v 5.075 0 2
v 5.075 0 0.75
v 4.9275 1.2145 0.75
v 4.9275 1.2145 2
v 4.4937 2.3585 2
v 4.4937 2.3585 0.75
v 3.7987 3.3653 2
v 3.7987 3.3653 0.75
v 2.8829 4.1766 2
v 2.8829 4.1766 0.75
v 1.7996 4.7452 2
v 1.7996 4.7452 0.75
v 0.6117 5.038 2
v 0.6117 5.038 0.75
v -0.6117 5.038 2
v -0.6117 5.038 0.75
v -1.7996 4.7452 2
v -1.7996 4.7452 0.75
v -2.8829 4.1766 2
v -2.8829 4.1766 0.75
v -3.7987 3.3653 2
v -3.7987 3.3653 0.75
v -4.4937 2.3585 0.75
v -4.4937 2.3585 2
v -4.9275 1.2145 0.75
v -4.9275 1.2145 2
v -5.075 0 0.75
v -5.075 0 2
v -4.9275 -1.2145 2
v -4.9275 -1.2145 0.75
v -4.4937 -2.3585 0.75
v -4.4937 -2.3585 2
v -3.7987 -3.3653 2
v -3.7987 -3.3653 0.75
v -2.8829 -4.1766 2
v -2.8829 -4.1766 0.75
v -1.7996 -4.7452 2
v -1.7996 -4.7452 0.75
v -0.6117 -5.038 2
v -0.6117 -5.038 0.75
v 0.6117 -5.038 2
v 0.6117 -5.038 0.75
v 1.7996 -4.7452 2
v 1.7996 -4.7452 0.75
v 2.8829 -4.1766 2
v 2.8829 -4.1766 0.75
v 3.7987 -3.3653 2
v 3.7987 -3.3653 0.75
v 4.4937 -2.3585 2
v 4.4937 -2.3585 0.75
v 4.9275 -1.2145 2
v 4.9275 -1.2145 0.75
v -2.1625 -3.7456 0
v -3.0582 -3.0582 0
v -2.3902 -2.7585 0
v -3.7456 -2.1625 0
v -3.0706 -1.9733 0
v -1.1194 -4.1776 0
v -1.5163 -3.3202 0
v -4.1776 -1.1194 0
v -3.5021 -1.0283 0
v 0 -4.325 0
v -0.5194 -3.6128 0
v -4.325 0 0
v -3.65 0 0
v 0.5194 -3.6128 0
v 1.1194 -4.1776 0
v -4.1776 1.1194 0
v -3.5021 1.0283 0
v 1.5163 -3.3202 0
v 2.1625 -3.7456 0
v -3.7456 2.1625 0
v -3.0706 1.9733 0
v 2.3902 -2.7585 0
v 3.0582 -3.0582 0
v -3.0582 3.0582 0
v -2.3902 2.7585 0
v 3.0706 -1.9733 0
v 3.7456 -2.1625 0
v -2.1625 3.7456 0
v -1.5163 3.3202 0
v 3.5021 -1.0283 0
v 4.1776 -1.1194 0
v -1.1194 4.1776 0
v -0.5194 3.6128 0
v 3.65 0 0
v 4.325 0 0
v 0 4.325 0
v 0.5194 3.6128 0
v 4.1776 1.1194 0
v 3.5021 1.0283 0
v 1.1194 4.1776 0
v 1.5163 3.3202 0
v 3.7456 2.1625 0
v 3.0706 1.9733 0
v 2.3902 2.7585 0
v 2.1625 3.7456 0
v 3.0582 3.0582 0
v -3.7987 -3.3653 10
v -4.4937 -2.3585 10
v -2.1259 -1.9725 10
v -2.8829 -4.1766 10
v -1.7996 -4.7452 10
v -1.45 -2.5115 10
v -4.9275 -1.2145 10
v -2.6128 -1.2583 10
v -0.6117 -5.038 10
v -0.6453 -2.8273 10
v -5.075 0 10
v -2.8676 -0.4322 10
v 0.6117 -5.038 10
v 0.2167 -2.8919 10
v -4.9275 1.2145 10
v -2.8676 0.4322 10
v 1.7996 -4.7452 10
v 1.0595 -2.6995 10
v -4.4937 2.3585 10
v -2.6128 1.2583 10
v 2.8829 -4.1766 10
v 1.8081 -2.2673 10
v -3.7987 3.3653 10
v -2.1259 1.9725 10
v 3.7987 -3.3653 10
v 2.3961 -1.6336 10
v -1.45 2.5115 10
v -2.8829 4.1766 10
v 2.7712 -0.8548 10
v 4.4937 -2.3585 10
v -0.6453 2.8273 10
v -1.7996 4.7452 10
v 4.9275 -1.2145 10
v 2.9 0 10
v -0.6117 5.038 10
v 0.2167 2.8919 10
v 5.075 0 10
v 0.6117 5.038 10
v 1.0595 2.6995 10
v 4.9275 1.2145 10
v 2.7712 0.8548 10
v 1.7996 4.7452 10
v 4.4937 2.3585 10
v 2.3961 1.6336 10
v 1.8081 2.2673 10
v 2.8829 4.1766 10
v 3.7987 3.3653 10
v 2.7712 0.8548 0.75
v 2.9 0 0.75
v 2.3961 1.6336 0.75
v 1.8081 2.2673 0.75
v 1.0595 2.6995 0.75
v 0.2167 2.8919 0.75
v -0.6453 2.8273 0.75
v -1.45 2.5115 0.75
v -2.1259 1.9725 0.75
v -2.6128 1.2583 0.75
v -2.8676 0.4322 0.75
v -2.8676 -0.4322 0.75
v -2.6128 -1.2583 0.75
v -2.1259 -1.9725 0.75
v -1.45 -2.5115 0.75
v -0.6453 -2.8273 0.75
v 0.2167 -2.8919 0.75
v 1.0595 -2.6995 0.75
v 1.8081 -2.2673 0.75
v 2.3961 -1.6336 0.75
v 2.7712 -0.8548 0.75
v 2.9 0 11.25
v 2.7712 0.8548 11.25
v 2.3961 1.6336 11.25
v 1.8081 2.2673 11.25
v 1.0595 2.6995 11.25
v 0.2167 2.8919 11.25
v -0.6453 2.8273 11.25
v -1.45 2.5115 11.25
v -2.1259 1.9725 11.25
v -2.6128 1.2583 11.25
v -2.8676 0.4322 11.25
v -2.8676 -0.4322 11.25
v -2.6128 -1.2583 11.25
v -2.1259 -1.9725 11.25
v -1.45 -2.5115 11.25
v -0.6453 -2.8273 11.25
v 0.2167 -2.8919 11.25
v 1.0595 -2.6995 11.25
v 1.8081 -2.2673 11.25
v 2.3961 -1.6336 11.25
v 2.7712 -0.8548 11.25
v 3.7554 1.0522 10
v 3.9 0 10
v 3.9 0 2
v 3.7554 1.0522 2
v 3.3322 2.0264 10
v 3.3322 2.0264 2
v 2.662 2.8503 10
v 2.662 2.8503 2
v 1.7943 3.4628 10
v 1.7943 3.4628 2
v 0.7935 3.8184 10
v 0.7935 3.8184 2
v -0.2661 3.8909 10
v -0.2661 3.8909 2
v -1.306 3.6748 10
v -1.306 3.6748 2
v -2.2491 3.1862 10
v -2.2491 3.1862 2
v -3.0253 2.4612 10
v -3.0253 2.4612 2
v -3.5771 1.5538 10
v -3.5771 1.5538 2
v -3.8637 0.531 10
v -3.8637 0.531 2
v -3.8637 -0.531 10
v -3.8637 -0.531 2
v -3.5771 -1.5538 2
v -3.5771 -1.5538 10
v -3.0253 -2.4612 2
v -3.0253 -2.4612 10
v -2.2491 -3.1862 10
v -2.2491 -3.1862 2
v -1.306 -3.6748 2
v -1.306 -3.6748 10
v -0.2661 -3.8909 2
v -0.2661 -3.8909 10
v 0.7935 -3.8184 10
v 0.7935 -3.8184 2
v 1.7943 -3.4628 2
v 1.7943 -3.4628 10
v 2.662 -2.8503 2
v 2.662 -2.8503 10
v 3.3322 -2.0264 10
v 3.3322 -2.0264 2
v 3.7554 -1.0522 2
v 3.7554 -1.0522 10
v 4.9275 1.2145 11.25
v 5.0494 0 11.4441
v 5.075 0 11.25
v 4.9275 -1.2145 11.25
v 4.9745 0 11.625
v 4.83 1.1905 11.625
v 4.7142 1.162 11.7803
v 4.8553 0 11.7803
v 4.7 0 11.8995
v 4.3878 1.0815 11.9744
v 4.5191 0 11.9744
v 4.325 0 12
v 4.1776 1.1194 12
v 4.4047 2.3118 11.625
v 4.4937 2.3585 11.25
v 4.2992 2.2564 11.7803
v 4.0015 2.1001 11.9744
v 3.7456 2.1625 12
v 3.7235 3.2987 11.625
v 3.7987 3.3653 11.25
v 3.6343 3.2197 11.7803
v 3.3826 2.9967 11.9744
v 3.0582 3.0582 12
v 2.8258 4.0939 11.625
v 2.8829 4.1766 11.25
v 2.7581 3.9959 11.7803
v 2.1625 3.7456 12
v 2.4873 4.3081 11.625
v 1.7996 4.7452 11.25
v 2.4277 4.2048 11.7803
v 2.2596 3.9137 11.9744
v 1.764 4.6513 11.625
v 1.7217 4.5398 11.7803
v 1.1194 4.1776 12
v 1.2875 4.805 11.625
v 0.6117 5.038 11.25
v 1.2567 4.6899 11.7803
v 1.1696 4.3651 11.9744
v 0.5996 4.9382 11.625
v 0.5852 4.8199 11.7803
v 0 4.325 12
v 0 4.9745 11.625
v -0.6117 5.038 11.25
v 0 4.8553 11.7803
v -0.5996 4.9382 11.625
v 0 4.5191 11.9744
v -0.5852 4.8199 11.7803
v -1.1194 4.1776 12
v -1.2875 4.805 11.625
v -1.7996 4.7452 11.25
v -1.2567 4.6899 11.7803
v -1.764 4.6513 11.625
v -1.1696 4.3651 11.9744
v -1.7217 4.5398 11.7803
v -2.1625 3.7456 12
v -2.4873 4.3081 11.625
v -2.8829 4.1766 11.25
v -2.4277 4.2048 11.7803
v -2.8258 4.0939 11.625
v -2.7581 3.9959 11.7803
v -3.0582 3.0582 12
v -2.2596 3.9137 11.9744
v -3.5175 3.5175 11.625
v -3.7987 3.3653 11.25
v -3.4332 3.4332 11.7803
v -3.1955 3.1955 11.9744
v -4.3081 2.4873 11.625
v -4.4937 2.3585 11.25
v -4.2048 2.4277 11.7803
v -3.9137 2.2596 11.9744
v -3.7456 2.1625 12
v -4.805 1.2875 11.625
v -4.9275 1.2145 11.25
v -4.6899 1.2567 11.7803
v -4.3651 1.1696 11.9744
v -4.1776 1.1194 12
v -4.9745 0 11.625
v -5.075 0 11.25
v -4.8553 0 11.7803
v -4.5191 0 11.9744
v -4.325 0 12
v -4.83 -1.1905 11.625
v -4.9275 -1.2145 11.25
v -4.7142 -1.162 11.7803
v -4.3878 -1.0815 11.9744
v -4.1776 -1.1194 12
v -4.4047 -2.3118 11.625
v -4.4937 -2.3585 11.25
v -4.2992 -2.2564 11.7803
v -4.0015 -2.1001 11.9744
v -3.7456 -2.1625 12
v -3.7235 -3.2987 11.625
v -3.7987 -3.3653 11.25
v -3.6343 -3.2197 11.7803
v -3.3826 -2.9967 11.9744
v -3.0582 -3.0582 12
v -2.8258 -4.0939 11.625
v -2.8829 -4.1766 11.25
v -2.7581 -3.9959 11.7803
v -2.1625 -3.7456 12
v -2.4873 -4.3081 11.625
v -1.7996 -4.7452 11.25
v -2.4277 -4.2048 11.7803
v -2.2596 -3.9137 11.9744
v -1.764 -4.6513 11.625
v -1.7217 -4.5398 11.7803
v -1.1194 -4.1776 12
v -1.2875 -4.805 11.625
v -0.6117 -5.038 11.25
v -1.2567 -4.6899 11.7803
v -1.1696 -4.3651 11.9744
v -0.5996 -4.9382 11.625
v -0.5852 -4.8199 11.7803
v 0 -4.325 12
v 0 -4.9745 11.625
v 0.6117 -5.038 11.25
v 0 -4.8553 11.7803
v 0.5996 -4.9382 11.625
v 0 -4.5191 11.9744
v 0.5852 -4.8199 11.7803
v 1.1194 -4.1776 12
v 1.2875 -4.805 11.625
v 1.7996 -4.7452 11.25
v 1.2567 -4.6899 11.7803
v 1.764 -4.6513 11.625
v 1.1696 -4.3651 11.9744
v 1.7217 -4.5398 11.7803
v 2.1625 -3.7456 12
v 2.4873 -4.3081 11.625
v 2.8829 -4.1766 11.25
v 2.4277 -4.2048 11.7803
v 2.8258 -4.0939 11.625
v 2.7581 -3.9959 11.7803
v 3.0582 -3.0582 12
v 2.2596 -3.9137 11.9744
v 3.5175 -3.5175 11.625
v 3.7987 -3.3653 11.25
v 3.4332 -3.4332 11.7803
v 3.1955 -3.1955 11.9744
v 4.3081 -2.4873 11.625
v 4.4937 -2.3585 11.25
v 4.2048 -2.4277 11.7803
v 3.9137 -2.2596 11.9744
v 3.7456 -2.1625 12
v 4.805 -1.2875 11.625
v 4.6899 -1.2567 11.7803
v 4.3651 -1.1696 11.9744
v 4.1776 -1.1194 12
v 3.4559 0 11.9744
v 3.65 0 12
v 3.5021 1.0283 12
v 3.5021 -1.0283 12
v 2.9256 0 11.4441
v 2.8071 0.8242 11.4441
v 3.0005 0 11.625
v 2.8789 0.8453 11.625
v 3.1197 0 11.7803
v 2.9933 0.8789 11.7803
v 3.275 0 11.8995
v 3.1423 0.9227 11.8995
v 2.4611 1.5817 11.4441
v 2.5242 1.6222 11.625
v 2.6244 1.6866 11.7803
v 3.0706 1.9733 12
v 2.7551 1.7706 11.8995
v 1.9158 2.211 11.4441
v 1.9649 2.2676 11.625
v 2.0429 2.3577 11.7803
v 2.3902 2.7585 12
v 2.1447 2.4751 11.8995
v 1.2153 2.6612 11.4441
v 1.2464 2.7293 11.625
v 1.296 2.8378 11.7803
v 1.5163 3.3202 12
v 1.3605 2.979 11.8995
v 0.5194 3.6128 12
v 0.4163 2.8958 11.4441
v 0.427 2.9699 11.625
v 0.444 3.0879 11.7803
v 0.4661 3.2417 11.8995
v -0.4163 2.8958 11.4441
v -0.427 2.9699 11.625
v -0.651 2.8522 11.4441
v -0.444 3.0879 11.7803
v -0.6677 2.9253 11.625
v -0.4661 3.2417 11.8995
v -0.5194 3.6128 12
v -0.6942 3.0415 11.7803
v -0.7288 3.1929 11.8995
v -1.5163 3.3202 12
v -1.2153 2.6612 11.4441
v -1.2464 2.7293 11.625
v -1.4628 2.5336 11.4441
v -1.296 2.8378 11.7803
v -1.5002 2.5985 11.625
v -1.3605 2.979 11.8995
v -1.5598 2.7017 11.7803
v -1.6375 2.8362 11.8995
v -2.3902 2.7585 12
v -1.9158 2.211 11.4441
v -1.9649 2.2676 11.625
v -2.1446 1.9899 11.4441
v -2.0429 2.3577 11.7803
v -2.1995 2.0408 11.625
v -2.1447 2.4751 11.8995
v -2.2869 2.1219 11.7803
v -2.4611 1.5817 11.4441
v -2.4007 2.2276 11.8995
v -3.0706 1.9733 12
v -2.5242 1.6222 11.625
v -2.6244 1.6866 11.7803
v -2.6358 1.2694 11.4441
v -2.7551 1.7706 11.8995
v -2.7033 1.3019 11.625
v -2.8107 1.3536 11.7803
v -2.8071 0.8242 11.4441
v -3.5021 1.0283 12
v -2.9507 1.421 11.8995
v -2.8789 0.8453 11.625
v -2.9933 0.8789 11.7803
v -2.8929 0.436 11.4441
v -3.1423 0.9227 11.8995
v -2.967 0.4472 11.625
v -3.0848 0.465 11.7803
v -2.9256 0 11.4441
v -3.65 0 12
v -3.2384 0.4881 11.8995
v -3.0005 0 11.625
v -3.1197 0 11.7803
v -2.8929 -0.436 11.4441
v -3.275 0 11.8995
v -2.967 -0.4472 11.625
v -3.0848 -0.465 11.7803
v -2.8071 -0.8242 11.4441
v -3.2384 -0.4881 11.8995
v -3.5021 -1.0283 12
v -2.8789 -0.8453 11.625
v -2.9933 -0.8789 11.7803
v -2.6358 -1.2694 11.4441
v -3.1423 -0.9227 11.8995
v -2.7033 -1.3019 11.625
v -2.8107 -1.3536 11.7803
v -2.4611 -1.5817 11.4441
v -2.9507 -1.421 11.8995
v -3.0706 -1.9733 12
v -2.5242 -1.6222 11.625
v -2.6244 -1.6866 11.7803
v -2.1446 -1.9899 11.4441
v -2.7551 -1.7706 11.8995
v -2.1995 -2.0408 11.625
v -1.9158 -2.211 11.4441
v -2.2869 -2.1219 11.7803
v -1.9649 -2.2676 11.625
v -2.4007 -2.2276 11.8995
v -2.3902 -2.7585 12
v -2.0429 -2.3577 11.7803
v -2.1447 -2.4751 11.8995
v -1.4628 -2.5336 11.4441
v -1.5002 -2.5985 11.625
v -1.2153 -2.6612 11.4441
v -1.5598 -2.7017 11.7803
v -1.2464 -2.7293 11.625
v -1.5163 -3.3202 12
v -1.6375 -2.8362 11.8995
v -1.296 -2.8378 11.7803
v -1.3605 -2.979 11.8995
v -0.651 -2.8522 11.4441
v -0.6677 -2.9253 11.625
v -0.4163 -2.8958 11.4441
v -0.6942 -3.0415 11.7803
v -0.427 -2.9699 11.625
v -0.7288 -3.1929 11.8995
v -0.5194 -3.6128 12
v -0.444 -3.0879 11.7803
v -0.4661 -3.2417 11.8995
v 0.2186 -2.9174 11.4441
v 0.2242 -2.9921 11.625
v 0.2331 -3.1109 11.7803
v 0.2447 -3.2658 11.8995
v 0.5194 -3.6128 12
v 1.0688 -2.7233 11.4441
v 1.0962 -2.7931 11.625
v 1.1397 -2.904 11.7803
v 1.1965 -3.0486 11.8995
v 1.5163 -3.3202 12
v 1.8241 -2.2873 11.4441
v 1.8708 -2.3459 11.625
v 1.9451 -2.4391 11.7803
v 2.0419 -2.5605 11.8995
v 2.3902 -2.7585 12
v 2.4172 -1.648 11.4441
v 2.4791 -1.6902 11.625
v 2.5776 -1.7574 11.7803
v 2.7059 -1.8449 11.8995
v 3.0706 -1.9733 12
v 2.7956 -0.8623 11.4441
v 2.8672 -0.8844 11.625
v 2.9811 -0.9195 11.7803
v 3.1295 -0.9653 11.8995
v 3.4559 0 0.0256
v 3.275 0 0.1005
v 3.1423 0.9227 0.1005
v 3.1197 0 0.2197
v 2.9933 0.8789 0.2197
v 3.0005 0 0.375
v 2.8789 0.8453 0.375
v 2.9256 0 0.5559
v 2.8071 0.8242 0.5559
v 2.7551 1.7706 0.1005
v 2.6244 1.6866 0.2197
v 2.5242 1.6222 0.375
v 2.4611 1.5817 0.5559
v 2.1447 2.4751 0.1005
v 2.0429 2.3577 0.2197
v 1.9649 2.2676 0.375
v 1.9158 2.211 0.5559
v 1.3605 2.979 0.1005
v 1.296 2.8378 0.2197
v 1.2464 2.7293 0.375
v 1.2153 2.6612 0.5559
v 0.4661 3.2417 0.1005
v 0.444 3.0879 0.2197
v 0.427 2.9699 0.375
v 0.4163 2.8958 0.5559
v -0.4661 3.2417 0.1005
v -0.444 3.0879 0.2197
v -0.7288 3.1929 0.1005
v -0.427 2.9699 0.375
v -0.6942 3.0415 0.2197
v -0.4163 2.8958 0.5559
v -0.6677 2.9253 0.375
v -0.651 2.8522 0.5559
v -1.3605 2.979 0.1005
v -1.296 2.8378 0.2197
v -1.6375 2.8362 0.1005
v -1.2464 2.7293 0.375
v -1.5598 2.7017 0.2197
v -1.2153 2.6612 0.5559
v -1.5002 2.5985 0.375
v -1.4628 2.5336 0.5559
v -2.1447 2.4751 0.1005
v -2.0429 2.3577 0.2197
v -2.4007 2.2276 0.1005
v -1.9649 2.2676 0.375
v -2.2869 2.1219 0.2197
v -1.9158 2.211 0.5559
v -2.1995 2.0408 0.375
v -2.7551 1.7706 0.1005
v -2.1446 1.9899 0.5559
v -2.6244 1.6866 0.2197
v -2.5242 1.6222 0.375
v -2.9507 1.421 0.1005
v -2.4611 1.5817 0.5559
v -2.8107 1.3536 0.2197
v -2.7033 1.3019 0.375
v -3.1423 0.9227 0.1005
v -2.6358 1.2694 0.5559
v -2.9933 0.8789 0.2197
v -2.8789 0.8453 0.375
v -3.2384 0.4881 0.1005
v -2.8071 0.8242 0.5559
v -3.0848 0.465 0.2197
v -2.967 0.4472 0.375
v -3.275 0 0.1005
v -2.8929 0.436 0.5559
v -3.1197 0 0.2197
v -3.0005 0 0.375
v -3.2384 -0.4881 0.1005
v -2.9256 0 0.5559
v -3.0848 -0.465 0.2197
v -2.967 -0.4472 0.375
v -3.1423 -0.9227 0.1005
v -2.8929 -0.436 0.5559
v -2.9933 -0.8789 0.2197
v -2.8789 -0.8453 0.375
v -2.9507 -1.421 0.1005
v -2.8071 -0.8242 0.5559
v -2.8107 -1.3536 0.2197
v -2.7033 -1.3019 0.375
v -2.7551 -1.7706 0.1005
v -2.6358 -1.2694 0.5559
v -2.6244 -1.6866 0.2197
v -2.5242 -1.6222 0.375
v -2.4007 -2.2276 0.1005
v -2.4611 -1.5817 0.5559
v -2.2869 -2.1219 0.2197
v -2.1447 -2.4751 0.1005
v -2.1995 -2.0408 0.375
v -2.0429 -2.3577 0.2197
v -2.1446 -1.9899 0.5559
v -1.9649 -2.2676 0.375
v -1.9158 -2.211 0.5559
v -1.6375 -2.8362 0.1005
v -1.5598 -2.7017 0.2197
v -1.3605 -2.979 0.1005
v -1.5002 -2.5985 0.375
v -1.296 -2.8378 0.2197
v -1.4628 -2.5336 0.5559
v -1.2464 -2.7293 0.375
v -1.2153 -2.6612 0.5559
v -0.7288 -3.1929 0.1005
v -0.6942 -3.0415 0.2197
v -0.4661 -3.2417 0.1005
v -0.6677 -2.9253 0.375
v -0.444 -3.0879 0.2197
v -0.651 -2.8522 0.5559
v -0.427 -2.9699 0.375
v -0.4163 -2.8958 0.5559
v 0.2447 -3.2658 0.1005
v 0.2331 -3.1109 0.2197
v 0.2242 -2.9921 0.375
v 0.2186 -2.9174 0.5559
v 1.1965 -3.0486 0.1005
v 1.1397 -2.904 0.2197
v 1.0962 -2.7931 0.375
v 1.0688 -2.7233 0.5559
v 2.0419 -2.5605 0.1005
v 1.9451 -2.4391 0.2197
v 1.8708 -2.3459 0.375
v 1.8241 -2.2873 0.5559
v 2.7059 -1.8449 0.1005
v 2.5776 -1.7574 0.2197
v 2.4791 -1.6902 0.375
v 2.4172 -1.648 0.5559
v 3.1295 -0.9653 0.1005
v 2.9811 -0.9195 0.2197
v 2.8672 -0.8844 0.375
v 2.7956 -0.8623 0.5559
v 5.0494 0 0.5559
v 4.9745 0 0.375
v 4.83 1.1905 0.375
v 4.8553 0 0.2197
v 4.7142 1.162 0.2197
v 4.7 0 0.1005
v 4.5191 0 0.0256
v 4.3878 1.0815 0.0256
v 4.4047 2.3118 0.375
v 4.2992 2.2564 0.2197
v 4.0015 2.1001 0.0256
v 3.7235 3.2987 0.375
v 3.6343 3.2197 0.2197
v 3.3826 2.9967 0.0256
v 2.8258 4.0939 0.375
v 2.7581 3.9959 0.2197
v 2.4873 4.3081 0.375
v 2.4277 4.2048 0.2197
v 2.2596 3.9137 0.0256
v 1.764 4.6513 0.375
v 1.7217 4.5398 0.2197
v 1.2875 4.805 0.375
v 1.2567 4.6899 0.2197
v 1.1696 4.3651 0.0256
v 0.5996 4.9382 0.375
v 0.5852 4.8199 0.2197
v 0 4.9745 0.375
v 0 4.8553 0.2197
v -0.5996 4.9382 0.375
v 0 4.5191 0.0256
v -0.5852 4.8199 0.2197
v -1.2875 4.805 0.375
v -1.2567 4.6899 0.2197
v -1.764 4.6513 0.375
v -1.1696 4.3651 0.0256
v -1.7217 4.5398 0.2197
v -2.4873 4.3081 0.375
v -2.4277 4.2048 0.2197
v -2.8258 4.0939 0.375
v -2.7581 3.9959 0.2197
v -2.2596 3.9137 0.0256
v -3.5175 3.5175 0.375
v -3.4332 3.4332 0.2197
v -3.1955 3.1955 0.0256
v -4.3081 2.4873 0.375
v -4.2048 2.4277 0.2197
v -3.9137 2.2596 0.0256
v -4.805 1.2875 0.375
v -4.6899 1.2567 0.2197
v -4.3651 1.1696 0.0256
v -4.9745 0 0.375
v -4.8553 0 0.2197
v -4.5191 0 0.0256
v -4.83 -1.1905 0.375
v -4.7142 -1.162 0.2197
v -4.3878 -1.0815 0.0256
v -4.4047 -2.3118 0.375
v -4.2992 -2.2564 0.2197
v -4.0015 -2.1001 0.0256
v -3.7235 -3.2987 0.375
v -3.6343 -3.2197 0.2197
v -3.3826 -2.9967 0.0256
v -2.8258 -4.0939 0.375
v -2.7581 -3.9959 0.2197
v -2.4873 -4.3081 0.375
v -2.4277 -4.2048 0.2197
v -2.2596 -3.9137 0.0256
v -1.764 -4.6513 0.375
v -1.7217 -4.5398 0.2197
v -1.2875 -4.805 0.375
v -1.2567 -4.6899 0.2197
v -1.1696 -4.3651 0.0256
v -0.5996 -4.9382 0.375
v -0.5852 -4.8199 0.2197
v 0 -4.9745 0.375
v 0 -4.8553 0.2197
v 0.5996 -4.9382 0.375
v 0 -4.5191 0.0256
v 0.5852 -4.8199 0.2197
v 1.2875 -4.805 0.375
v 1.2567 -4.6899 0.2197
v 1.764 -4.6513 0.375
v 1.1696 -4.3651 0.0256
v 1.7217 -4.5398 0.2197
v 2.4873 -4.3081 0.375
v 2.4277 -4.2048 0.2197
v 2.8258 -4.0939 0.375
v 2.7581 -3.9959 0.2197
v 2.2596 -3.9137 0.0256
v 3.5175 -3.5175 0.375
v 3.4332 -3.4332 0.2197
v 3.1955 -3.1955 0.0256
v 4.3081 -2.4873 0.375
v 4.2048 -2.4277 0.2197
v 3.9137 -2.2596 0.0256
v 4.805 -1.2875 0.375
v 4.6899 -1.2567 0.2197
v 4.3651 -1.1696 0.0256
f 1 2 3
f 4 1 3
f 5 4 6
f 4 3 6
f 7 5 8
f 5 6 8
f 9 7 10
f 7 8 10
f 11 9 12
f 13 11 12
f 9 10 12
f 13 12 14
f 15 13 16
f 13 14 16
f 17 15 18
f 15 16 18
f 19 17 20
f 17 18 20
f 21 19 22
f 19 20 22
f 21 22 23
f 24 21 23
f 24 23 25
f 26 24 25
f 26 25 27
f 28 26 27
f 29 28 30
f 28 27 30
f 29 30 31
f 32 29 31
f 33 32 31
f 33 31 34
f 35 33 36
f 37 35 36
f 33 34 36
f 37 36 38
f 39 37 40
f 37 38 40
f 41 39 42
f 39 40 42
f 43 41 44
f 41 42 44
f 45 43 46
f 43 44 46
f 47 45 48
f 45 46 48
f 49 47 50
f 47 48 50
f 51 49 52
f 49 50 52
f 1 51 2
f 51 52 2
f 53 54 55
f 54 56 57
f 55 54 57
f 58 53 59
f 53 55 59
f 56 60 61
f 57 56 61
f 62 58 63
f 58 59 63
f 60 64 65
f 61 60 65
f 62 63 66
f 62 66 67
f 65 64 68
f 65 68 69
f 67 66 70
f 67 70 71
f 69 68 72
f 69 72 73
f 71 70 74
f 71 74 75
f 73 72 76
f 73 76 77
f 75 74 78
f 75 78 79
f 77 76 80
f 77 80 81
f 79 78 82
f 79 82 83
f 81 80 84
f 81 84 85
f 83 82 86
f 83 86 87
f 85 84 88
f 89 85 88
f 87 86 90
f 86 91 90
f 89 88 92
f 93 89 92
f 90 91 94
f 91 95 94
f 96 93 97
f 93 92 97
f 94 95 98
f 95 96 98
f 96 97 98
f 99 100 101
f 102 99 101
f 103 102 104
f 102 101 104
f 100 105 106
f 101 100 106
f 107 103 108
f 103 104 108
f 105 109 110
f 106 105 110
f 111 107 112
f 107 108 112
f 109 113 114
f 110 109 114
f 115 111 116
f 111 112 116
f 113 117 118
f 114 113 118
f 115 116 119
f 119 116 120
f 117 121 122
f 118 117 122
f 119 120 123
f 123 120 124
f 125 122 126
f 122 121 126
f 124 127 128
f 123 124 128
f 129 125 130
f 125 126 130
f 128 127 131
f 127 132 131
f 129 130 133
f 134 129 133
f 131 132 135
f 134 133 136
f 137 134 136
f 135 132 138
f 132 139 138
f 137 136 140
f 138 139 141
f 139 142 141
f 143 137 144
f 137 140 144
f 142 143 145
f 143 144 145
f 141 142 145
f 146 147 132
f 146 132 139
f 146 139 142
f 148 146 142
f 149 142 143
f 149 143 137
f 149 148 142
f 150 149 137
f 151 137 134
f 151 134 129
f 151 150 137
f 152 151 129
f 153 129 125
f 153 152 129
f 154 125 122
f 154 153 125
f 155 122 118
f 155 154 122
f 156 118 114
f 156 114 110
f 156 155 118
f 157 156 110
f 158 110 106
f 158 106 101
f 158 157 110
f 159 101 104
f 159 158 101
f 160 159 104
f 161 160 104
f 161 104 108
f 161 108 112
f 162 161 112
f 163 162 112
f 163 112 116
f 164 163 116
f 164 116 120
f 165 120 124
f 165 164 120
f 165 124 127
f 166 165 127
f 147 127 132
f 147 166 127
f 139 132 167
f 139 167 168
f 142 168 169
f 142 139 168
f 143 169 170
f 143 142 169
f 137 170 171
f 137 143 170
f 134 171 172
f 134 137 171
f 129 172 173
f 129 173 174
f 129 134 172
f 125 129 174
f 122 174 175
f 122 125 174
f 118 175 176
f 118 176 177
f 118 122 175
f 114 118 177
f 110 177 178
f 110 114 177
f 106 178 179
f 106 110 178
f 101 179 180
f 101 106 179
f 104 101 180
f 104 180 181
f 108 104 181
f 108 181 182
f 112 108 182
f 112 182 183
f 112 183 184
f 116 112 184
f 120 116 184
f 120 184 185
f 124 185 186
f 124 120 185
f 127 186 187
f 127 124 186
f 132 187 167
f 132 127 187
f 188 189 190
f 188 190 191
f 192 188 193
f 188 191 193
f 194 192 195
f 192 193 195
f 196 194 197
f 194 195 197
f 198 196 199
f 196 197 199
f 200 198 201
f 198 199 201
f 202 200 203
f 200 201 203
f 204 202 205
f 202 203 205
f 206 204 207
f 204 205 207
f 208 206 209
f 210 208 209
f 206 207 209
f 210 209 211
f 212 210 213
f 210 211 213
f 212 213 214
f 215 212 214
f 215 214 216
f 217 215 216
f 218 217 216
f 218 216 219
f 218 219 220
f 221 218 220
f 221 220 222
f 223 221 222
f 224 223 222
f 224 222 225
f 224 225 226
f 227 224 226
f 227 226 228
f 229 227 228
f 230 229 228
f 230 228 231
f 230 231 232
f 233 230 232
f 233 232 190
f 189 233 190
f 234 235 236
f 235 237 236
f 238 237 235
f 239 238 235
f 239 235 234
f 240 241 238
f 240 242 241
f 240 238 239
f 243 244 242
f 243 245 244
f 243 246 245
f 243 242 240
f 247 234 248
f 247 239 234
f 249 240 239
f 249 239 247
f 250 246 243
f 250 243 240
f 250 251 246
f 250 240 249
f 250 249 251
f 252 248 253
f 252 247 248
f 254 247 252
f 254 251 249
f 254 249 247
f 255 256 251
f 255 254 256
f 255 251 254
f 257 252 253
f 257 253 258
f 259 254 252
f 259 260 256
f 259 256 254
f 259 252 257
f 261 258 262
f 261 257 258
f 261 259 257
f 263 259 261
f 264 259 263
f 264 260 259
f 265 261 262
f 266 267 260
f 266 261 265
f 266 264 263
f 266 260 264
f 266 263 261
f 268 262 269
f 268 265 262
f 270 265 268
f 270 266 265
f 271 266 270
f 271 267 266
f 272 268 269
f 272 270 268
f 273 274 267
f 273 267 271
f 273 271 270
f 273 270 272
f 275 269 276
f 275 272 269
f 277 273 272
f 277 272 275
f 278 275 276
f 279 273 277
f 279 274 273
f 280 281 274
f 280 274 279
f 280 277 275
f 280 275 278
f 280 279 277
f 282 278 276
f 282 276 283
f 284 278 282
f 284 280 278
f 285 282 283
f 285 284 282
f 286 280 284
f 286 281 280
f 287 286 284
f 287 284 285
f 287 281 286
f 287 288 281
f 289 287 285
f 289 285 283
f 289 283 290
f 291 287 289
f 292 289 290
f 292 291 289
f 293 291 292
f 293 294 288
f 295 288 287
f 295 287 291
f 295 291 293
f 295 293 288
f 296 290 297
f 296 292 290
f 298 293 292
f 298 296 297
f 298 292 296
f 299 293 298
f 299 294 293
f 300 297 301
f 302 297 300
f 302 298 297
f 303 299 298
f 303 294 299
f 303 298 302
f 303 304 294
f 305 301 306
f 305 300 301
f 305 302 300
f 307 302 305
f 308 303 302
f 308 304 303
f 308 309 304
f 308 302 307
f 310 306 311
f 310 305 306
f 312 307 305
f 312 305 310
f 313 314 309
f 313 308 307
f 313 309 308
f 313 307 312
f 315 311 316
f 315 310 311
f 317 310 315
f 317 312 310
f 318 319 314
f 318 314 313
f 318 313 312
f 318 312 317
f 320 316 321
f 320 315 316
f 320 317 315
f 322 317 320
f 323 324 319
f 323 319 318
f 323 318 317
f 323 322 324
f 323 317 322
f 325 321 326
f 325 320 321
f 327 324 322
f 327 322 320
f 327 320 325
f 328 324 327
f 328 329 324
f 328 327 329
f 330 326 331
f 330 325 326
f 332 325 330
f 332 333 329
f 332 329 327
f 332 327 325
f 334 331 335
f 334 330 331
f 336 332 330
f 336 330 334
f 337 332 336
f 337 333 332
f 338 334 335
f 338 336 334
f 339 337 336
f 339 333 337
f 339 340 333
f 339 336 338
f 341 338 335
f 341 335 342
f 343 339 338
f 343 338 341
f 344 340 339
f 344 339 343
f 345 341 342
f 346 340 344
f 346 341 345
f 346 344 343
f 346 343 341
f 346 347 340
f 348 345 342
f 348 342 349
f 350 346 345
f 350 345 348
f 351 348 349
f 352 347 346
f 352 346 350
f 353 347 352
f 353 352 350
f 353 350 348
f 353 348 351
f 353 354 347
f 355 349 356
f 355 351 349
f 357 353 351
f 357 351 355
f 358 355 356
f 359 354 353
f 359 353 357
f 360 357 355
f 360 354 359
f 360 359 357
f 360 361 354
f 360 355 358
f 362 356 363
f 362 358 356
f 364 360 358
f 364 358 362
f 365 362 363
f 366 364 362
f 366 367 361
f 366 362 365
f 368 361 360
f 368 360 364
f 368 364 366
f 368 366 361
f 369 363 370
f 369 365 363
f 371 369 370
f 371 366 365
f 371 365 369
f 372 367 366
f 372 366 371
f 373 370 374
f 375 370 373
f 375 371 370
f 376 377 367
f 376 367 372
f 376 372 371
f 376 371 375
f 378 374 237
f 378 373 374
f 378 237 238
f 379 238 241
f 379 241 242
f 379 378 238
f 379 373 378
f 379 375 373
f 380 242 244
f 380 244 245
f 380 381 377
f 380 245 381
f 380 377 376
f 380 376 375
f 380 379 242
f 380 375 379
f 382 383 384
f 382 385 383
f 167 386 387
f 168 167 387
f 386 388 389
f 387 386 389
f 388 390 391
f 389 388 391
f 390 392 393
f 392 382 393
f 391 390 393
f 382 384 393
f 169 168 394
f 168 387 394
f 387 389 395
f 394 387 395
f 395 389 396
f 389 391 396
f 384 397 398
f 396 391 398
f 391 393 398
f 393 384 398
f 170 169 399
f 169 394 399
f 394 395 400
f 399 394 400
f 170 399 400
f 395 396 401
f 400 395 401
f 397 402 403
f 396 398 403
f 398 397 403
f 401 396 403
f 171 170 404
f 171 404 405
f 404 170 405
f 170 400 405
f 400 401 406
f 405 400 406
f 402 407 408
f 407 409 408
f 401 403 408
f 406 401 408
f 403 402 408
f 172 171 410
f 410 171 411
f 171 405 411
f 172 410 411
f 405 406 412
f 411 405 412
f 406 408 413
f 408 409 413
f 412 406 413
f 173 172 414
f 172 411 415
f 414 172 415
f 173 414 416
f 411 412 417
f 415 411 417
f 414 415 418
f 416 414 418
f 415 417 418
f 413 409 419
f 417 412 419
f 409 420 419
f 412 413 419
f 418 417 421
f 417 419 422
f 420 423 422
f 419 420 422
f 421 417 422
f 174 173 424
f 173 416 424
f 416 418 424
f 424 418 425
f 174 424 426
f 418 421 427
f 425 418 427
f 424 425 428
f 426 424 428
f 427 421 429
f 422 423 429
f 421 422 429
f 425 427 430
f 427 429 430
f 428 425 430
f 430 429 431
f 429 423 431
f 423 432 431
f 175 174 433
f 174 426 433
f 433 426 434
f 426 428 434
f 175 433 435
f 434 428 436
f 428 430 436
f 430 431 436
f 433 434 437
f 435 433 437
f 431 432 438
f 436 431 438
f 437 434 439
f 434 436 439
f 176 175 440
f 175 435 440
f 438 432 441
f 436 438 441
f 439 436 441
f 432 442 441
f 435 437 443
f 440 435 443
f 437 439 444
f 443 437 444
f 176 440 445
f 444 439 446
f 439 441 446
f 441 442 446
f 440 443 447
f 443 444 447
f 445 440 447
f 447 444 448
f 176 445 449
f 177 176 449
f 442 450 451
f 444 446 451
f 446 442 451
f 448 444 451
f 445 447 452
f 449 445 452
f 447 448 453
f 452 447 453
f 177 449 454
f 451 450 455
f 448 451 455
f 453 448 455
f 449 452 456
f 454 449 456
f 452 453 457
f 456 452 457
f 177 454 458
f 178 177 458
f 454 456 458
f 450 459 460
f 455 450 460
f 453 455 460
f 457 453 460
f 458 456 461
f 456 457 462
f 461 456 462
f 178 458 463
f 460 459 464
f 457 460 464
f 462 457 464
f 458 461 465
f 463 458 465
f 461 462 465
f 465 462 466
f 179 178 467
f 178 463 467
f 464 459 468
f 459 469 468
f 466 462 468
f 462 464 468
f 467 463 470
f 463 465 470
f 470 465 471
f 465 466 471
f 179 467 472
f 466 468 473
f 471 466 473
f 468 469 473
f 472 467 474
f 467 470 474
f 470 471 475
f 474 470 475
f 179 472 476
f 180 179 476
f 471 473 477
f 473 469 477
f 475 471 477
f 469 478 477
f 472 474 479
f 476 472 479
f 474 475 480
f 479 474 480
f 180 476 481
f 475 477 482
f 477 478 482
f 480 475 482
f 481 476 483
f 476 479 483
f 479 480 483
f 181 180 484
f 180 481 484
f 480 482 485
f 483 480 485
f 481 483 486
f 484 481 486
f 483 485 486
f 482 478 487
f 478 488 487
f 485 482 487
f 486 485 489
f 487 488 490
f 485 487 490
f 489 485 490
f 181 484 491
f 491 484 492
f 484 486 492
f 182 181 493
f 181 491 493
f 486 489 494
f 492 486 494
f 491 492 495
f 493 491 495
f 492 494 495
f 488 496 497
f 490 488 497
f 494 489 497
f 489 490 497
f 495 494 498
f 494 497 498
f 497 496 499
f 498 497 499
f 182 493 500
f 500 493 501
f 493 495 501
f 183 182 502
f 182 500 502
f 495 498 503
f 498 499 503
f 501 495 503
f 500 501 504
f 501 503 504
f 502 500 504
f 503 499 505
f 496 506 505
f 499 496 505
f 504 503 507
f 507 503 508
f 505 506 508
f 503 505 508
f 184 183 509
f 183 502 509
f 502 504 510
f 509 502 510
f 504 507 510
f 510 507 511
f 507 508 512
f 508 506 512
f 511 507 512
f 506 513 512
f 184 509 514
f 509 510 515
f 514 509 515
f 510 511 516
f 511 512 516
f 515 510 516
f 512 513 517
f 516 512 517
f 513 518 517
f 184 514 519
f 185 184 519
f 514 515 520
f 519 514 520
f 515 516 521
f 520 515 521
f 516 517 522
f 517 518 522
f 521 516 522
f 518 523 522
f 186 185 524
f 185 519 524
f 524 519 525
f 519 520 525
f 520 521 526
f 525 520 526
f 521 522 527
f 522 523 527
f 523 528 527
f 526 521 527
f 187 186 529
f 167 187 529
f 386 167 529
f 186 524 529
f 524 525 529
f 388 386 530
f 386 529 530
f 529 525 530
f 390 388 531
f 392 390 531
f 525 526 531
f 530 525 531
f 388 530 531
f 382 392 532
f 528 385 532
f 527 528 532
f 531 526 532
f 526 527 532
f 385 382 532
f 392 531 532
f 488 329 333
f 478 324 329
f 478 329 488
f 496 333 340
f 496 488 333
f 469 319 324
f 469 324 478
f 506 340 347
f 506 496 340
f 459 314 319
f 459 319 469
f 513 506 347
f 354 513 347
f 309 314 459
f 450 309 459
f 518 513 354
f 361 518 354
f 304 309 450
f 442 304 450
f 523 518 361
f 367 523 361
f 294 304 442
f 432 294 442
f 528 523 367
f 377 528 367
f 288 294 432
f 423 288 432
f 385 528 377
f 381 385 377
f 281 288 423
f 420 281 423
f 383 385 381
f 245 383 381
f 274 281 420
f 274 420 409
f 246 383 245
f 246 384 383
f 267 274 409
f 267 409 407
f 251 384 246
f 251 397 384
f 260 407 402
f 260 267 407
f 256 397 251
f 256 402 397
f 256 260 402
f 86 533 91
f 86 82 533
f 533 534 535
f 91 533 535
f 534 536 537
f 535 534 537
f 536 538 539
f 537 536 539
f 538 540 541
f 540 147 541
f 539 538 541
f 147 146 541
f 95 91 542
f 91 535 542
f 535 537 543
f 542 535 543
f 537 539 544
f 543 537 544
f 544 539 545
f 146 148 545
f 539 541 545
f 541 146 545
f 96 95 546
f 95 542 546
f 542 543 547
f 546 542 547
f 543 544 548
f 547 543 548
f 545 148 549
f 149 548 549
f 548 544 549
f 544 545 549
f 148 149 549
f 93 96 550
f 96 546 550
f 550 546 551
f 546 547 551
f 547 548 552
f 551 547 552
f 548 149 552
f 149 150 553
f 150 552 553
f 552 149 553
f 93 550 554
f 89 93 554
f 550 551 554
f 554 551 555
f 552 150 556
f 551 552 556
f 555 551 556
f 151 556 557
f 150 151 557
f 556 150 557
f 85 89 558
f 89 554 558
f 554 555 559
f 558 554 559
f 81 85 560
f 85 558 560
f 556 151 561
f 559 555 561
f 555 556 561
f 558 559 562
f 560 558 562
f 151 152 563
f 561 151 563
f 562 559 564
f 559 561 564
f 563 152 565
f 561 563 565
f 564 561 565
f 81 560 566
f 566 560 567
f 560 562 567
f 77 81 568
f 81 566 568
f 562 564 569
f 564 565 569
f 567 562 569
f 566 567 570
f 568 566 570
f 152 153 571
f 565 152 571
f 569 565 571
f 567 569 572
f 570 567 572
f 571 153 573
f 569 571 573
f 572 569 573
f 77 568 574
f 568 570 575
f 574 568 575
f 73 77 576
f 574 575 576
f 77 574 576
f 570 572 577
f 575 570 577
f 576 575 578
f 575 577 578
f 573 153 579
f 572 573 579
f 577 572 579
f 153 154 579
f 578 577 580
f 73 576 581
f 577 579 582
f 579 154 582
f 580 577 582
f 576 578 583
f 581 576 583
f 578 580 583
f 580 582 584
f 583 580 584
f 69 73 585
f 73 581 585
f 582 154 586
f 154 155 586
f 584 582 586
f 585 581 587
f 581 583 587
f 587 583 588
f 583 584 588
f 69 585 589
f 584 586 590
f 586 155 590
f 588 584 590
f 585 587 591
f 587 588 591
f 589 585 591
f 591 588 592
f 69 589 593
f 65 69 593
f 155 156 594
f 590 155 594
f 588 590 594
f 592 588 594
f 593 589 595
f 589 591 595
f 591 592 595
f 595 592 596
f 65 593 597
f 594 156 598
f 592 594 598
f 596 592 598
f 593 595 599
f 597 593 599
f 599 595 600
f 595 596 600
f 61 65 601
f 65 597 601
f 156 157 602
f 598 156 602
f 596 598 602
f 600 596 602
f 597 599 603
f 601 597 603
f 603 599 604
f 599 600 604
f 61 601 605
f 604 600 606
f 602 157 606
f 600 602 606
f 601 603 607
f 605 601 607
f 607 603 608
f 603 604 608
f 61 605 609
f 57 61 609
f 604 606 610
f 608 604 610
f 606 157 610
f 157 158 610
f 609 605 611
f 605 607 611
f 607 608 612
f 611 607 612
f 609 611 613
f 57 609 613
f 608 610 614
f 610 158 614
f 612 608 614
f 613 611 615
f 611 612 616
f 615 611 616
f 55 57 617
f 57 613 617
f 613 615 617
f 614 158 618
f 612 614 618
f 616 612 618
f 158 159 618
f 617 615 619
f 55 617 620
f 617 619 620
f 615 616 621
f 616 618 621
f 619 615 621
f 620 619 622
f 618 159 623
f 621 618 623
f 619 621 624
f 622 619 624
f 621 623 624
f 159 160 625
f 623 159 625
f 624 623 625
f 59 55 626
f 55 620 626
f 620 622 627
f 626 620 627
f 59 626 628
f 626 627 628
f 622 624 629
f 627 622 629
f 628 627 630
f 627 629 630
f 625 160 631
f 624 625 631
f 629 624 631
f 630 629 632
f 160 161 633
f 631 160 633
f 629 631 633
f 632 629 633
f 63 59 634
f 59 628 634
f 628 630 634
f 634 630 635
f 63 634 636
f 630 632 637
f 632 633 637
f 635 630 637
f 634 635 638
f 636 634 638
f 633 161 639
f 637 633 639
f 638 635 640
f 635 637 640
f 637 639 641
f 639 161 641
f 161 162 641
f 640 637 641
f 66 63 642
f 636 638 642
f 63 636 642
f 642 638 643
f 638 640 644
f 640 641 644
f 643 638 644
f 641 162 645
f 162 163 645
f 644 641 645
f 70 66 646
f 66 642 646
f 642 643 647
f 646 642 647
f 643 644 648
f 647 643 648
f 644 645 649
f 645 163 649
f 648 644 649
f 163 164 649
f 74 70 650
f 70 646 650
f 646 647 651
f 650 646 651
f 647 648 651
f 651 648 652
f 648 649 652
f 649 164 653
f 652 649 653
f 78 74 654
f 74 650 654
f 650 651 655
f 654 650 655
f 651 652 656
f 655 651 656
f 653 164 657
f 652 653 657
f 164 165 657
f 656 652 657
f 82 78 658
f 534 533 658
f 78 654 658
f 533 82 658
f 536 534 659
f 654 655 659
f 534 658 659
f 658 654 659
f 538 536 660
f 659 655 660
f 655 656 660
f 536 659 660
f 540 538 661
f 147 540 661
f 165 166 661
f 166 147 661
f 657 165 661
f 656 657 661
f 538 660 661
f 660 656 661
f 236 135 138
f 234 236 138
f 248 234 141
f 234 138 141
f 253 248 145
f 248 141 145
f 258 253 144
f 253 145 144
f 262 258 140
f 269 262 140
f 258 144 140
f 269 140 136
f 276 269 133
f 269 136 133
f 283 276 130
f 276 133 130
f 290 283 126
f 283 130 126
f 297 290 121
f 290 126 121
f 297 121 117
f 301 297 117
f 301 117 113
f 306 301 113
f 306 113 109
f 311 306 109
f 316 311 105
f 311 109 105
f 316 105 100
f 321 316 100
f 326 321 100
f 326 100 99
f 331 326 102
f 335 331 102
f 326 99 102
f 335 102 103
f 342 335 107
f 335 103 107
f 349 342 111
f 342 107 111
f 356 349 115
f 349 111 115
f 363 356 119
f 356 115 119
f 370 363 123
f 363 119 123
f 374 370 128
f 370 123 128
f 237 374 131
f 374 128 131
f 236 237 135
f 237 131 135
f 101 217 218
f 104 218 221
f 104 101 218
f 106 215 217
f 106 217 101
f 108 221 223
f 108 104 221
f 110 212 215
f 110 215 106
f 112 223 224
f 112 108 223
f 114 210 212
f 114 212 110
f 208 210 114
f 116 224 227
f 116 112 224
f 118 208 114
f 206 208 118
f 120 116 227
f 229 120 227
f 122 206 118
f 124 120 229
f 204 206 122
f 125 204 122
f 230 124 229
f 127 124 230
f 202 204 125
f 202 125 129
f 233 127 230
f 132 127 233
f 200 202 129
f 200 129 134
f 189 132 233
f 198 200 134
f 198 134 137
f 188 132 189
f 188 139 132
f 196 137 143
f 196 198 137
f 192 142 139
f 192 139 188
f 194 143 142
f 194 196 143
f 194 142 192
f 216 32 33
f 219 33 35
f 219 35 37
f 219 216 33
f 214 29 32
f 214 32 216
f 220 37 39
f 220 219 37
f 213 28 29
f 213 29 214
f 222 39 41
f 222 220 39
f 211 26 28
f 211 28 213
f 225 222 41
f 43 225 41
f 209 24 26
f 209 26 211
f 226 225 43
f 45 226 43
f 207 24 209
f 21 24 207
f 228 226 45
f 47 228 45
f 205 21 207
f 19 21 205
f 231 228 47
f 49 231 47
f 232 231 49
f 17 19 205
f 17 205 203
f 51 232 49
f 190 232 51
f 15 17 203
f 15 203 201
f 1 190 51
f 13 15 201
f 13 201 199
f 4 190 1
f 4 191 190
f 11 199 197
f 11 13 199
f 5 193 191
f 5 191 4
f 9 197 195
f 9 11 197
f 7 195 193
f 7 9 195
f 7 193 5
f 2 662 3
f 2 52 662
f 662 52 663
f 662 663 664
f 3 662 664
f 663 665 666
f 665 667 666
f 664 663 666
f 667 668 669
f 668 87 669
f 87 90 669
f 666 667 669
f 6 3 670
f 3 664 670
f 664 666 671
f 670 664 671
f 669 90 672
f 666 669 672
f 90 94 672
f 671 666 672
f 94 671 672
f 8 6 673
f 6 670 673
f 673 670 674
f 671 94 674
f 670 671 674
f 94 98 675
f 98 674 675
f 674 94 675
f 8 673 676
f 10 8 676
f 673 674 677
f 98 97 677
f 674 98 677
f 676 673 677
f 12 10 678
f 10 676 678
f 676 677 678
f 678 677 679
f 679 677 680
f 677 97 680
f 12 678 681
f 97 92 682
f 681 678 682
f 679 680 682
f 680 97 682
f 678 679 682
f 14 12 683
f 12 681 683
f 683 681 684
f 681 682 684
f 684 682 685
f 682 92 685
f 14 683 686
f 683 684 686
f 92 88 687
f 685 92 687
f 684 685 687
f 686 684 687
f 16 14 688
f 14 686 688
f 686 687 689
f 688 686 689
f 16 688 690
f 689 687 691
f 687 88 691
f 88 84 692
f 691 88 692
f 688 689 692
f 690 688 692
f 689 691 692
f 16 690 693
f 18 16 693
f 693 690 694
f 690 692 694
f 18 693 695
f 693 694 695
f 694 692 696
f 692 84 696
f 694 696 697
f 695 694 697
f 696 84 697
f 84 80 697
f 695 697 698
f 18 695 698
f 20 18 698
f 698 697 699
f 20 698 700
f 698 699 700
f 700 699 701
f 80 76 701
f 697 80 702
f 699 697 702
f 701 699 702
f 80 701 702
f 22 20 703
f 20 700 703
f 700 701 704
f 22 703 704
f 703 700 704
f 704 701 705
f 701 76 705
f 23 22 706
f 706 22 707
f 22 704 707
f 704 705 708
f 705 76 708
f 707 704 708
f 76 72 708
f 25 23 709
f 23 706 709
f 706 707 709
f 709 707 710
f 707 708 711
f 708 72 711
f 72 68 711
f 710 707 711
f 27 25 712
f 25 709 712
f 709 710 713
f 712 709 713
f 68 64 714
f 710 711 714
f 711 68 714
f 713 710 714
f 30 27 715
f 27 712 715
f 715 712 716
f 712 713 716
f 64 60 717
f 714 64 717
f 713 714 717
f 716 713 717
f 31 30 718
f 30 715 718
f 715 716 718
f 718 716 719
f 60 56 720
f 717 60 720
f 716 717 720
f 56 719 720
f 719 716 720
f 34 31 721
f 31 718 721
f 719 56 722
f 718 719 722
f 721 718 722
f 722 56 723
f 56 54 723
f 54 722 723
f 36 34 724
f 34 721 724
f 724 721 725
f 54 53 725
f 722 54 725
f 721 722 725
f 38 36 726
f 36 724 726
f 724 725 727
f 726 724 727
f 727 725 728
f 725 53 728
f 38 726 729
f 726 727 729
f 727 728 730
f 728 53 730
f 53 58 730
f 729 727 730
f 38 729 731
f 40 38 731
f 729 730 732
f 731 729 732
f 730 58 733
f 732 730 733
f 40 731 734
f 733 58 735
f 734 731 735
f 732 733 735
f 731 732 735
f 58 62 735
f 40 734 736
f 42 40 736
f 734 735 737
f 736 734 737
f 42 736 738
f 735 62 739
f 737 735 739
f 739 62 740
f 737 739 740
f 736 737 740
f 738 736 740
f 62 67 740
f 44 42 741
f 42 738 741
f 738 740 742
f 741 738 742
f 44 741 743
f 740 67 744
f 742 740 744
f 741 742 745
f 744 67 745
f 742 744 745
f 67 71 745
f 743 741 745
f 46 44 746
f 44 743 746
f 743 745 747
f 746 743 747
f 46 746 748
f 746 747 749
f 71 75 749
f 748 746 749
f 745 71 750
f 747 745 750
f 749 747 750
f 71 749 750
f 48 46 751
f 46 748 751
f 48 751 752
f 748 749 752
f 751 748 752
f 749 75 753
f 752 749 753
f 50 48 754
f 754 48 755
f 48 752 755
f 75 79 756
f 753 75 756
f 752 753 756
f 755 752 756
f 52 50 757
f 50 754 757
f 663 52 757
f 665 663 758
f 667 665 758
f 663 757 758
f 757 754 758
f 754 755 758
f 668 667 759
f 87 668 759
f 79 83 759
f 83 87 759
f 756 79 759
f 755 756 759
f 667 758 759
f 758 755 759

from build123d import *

# Parameters (mm, degrees)
F0_R     = 3.9
F0_R_2   = 2.9
F1_DEPTH = 10
F0_R_3   = 5.075
F2_DEPTH = 2
F3_R     = 0.75
F4_R     = 5.075
F4_R_2   = 3.9
F4_R_3   = 2.9
F5_DEPTH = 2
F6_R     = 0.75


with BuildPart() as f1:
    # F0 (on Top) → F1 (new body)
    with BuildSketch(Plane.XY):
        Circle(F0_R)
        Circle(F0_R_2, mode=Mode.SUBTRACT)
    extrude(amount=F1_DEPTH)

    # F0 (on Top) → F2 (join)
    with BuildSketch(Plane.XY):
        Circle(F0_R_3)
        Circle(F0_R, mode=Mode.SUBTRACT)
    extrude(amount=F2_DEPTH)

    # F3
    f3_edges = [f1.edges().sort_by_distance(p)[0] for p in [
        (-5.075, 0, 0),
        (-2.9, 0, 0),
    ]]
    fillet(f3_edges, radius=F3_R)


with BuildPart() as f5:
    # F4 (on face) → F5 (new body)
    with BuildSketch(Plane.XY.offset(10)):
        Circle(F4_R)
        Circle(F4_R_2, mode=Mode.SUBTRACT)
        Circle(F4_R_2)
        Circle(F4_R_3, mode=Mode.SUBTRACT)
    extrude(amount=F5_DEPTH)

    # F6
    f6_edges = [f5.edges().sort_by_distance(p)[0] for p in [
        (-5.075, 0, 12),
        (-2.9, 0, 12),
    ]]
    fillet(f6_edges, radius=F6_R)


solid = Compound([f1.part, f5.part])
